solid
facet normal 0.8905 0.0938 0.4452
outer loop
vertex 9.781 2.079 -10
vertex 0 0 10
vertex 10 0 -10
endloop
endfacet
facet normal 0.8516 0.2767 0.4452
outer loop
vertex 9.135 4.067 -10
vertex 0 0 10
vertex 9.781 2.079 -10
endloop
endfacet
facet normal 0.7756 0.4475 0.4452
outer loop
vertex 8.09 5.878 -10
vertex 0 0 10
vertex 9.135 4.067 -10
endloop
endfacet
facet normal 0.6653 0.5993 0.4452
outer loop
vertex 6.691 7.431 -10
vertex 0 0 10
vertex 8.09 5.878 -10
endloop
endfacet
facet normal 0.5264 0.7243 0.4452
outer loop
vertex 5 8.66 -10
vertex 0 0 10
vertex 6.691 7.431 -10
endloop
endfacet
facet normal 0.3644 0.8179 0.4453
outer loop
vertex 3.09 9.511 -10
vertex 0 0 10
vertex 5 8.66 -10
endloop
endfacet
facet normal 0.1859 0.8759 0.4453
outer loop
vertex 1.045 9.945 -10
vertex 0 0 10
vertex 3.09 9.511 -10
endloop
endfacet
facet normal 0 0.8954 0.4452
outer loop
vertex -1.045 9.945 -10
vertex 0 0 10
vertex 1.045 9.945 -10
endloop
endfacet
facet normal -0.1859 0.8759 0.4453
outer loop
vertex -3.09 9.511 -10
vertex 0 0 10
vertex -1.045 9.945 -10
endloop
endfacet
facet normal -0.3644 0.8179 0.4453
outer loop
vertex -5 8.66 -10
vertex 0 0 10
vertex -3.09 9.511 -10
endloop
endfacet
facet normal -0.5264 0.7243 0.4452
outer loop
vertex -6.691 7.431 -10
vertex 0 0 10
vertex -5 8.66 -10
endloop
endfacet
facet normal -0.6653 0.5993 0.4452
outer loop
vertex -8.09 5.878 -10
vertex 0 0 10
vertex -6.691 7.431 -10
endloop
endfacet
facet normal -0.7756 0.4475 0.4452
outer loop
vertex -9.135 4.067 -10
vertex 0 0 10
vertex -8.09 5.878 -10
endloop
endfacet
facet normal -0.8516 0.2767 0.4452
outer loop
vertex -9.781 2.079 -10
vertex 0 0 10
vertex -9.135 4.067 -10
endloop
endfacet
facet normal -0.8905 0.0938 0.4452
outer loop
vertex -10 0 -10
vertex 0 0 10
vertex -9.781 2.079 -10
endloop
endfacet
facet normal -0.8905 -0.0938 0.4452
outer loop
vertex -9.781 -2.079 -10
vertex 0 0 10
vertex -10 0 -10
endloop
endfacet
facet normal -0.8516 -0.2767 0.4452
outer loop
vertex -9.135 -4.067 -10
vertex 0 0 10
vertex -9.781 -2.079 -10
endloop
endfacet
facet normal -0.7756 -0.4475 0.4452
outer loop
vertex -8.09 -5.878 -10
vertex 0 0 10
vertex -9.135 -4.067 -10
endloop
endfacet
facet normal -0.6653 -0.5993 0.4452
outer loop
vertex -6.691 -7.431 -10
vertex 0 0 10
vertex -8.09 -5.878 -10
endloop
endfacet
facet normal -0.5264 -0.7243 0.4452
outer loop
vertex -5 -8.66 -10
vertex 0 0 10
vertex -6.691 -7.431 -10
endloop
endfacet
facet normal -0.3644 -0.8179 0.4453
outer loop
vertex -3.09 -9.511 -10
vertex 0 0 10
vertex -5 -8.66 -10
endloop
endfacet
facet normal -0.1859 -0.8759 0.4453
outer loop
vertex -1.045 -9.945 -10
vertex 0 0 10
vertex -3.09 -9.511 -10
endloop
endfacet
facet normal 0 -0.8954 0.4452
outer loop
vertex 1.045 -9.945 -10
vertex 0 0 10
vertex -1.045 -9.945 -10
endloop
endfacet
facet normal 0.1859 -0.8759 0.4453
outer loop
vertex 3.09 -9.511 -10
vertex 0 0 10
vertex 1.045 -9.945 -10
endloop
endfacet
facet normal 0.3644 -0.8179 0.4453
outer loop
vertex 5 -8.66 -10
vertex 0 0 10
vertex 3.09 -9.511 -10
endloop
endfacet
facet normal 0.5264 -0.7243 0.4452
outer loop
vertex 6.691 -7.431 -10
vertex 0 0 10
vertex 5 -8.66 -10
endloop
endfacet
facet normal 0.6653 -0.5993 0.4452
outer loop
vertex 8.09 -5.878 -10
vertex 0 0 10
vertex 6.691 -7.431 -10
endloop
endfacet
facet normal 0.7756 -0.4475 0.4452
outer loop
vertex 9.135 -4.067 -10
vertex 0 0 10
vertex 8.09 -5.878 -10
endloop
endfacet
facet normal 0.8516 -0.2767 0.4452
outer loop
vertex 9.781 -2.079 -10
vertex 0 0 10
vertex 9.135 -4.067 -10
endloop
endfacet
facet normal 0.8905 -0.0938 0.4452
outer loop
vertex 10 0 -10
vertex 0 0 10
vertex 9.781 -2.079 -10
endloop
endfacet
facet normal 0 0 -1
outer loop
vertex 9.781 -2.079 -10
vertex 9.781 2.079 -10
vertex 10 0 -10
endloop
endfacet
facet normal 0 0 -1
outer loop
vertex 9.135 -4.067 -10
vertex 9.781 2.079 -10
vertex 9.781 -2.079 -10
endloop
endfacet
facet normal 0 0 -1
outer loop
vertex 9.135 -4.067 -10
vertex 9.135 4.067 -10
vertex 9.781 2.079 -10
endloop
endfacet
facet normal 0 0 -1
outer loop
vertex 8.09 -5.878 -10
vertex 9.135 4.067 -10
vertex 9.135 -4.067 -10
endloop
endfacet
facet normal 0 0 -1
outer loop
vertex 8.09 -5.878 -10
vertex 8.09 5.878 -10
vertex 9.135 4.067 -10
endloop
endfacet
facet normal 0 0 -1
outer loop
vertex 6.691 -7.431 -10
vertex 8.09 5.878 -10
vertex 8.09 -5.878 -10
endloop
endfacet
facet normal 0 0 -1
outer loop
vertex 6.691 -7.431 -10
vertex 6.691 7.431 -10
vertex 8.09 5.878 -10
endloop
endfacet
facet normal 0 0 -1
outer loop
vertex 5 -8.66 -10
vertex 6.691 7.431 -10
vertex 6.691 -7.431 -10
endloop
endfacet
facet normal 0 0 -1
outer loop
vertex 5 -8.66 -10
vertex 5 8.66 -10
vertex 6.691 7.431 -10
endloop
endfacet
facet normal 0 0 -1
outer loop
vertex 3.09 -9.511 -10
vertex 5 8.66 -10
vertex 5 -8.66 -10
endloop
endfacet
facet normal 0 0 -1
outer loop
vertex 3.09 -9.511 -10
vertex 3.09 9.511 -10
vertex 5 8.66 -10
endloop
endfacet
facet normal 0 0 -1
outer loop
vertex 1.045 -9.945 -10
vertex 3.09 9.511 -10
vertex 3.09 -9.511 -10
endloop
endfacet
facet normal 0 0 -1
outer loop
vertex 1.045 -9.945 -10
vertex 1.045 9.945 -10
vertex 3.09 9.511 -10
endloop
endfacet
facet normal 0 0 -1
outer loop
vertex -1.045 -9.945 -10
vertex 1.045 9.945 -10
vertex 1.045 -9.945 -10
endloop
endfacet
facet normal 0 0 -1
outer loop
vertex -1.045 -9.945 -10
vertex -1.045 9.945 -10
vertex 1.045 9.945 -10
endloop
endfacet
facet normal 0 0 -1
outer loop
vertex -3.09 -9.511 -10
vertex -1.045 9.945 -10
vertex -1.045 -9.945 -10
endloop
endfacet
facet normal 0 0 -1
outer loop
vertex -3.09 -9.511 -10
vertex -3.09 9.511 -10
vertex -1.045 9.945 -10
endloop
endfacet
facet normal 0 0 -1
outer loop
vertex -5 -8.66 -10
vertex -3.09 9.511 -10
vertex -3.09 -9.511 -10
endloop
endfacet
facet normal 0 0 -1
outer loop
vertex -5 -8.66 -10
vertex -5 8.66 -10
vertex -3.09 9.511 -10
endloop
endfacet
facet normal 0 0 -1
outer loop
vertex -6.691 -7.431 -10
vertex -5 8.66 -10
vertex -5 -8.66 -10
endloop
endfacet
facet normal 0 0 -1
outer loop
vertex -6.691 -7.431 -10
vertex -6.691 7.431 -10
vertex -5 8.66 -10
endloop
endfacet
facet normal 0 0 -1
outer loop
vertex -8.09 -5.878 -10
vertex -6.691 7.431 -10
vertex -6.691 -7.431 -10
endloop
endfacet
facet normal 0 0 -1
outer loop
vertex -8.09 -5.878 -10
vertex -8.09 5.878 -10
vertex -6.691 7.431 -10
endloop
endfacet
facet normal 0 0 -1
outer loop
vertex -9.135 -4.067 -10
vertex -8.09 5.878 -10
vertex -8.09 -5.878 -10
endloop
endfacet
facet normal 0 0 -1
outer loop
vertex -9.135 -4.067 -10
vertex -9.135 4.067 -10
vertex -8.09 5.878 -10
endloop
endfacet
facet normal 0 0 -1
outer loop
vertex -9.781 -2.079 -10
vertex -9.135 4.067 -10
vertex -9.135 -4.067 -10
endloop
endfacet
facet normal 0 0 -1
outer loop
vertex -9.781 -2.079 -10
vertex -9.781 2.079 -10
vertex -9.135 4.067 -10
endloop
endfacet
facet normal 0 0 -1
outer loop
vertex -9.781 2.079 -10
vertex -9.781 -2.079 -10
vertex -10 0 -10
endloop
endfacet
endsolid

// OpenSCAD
// param: radius=10, height=20
module param_cone(radius=10, height=20) {
    cylinder(r1=radius, r2=0, h=height, center=true);
}
param_cone(radius=10, height=20);
